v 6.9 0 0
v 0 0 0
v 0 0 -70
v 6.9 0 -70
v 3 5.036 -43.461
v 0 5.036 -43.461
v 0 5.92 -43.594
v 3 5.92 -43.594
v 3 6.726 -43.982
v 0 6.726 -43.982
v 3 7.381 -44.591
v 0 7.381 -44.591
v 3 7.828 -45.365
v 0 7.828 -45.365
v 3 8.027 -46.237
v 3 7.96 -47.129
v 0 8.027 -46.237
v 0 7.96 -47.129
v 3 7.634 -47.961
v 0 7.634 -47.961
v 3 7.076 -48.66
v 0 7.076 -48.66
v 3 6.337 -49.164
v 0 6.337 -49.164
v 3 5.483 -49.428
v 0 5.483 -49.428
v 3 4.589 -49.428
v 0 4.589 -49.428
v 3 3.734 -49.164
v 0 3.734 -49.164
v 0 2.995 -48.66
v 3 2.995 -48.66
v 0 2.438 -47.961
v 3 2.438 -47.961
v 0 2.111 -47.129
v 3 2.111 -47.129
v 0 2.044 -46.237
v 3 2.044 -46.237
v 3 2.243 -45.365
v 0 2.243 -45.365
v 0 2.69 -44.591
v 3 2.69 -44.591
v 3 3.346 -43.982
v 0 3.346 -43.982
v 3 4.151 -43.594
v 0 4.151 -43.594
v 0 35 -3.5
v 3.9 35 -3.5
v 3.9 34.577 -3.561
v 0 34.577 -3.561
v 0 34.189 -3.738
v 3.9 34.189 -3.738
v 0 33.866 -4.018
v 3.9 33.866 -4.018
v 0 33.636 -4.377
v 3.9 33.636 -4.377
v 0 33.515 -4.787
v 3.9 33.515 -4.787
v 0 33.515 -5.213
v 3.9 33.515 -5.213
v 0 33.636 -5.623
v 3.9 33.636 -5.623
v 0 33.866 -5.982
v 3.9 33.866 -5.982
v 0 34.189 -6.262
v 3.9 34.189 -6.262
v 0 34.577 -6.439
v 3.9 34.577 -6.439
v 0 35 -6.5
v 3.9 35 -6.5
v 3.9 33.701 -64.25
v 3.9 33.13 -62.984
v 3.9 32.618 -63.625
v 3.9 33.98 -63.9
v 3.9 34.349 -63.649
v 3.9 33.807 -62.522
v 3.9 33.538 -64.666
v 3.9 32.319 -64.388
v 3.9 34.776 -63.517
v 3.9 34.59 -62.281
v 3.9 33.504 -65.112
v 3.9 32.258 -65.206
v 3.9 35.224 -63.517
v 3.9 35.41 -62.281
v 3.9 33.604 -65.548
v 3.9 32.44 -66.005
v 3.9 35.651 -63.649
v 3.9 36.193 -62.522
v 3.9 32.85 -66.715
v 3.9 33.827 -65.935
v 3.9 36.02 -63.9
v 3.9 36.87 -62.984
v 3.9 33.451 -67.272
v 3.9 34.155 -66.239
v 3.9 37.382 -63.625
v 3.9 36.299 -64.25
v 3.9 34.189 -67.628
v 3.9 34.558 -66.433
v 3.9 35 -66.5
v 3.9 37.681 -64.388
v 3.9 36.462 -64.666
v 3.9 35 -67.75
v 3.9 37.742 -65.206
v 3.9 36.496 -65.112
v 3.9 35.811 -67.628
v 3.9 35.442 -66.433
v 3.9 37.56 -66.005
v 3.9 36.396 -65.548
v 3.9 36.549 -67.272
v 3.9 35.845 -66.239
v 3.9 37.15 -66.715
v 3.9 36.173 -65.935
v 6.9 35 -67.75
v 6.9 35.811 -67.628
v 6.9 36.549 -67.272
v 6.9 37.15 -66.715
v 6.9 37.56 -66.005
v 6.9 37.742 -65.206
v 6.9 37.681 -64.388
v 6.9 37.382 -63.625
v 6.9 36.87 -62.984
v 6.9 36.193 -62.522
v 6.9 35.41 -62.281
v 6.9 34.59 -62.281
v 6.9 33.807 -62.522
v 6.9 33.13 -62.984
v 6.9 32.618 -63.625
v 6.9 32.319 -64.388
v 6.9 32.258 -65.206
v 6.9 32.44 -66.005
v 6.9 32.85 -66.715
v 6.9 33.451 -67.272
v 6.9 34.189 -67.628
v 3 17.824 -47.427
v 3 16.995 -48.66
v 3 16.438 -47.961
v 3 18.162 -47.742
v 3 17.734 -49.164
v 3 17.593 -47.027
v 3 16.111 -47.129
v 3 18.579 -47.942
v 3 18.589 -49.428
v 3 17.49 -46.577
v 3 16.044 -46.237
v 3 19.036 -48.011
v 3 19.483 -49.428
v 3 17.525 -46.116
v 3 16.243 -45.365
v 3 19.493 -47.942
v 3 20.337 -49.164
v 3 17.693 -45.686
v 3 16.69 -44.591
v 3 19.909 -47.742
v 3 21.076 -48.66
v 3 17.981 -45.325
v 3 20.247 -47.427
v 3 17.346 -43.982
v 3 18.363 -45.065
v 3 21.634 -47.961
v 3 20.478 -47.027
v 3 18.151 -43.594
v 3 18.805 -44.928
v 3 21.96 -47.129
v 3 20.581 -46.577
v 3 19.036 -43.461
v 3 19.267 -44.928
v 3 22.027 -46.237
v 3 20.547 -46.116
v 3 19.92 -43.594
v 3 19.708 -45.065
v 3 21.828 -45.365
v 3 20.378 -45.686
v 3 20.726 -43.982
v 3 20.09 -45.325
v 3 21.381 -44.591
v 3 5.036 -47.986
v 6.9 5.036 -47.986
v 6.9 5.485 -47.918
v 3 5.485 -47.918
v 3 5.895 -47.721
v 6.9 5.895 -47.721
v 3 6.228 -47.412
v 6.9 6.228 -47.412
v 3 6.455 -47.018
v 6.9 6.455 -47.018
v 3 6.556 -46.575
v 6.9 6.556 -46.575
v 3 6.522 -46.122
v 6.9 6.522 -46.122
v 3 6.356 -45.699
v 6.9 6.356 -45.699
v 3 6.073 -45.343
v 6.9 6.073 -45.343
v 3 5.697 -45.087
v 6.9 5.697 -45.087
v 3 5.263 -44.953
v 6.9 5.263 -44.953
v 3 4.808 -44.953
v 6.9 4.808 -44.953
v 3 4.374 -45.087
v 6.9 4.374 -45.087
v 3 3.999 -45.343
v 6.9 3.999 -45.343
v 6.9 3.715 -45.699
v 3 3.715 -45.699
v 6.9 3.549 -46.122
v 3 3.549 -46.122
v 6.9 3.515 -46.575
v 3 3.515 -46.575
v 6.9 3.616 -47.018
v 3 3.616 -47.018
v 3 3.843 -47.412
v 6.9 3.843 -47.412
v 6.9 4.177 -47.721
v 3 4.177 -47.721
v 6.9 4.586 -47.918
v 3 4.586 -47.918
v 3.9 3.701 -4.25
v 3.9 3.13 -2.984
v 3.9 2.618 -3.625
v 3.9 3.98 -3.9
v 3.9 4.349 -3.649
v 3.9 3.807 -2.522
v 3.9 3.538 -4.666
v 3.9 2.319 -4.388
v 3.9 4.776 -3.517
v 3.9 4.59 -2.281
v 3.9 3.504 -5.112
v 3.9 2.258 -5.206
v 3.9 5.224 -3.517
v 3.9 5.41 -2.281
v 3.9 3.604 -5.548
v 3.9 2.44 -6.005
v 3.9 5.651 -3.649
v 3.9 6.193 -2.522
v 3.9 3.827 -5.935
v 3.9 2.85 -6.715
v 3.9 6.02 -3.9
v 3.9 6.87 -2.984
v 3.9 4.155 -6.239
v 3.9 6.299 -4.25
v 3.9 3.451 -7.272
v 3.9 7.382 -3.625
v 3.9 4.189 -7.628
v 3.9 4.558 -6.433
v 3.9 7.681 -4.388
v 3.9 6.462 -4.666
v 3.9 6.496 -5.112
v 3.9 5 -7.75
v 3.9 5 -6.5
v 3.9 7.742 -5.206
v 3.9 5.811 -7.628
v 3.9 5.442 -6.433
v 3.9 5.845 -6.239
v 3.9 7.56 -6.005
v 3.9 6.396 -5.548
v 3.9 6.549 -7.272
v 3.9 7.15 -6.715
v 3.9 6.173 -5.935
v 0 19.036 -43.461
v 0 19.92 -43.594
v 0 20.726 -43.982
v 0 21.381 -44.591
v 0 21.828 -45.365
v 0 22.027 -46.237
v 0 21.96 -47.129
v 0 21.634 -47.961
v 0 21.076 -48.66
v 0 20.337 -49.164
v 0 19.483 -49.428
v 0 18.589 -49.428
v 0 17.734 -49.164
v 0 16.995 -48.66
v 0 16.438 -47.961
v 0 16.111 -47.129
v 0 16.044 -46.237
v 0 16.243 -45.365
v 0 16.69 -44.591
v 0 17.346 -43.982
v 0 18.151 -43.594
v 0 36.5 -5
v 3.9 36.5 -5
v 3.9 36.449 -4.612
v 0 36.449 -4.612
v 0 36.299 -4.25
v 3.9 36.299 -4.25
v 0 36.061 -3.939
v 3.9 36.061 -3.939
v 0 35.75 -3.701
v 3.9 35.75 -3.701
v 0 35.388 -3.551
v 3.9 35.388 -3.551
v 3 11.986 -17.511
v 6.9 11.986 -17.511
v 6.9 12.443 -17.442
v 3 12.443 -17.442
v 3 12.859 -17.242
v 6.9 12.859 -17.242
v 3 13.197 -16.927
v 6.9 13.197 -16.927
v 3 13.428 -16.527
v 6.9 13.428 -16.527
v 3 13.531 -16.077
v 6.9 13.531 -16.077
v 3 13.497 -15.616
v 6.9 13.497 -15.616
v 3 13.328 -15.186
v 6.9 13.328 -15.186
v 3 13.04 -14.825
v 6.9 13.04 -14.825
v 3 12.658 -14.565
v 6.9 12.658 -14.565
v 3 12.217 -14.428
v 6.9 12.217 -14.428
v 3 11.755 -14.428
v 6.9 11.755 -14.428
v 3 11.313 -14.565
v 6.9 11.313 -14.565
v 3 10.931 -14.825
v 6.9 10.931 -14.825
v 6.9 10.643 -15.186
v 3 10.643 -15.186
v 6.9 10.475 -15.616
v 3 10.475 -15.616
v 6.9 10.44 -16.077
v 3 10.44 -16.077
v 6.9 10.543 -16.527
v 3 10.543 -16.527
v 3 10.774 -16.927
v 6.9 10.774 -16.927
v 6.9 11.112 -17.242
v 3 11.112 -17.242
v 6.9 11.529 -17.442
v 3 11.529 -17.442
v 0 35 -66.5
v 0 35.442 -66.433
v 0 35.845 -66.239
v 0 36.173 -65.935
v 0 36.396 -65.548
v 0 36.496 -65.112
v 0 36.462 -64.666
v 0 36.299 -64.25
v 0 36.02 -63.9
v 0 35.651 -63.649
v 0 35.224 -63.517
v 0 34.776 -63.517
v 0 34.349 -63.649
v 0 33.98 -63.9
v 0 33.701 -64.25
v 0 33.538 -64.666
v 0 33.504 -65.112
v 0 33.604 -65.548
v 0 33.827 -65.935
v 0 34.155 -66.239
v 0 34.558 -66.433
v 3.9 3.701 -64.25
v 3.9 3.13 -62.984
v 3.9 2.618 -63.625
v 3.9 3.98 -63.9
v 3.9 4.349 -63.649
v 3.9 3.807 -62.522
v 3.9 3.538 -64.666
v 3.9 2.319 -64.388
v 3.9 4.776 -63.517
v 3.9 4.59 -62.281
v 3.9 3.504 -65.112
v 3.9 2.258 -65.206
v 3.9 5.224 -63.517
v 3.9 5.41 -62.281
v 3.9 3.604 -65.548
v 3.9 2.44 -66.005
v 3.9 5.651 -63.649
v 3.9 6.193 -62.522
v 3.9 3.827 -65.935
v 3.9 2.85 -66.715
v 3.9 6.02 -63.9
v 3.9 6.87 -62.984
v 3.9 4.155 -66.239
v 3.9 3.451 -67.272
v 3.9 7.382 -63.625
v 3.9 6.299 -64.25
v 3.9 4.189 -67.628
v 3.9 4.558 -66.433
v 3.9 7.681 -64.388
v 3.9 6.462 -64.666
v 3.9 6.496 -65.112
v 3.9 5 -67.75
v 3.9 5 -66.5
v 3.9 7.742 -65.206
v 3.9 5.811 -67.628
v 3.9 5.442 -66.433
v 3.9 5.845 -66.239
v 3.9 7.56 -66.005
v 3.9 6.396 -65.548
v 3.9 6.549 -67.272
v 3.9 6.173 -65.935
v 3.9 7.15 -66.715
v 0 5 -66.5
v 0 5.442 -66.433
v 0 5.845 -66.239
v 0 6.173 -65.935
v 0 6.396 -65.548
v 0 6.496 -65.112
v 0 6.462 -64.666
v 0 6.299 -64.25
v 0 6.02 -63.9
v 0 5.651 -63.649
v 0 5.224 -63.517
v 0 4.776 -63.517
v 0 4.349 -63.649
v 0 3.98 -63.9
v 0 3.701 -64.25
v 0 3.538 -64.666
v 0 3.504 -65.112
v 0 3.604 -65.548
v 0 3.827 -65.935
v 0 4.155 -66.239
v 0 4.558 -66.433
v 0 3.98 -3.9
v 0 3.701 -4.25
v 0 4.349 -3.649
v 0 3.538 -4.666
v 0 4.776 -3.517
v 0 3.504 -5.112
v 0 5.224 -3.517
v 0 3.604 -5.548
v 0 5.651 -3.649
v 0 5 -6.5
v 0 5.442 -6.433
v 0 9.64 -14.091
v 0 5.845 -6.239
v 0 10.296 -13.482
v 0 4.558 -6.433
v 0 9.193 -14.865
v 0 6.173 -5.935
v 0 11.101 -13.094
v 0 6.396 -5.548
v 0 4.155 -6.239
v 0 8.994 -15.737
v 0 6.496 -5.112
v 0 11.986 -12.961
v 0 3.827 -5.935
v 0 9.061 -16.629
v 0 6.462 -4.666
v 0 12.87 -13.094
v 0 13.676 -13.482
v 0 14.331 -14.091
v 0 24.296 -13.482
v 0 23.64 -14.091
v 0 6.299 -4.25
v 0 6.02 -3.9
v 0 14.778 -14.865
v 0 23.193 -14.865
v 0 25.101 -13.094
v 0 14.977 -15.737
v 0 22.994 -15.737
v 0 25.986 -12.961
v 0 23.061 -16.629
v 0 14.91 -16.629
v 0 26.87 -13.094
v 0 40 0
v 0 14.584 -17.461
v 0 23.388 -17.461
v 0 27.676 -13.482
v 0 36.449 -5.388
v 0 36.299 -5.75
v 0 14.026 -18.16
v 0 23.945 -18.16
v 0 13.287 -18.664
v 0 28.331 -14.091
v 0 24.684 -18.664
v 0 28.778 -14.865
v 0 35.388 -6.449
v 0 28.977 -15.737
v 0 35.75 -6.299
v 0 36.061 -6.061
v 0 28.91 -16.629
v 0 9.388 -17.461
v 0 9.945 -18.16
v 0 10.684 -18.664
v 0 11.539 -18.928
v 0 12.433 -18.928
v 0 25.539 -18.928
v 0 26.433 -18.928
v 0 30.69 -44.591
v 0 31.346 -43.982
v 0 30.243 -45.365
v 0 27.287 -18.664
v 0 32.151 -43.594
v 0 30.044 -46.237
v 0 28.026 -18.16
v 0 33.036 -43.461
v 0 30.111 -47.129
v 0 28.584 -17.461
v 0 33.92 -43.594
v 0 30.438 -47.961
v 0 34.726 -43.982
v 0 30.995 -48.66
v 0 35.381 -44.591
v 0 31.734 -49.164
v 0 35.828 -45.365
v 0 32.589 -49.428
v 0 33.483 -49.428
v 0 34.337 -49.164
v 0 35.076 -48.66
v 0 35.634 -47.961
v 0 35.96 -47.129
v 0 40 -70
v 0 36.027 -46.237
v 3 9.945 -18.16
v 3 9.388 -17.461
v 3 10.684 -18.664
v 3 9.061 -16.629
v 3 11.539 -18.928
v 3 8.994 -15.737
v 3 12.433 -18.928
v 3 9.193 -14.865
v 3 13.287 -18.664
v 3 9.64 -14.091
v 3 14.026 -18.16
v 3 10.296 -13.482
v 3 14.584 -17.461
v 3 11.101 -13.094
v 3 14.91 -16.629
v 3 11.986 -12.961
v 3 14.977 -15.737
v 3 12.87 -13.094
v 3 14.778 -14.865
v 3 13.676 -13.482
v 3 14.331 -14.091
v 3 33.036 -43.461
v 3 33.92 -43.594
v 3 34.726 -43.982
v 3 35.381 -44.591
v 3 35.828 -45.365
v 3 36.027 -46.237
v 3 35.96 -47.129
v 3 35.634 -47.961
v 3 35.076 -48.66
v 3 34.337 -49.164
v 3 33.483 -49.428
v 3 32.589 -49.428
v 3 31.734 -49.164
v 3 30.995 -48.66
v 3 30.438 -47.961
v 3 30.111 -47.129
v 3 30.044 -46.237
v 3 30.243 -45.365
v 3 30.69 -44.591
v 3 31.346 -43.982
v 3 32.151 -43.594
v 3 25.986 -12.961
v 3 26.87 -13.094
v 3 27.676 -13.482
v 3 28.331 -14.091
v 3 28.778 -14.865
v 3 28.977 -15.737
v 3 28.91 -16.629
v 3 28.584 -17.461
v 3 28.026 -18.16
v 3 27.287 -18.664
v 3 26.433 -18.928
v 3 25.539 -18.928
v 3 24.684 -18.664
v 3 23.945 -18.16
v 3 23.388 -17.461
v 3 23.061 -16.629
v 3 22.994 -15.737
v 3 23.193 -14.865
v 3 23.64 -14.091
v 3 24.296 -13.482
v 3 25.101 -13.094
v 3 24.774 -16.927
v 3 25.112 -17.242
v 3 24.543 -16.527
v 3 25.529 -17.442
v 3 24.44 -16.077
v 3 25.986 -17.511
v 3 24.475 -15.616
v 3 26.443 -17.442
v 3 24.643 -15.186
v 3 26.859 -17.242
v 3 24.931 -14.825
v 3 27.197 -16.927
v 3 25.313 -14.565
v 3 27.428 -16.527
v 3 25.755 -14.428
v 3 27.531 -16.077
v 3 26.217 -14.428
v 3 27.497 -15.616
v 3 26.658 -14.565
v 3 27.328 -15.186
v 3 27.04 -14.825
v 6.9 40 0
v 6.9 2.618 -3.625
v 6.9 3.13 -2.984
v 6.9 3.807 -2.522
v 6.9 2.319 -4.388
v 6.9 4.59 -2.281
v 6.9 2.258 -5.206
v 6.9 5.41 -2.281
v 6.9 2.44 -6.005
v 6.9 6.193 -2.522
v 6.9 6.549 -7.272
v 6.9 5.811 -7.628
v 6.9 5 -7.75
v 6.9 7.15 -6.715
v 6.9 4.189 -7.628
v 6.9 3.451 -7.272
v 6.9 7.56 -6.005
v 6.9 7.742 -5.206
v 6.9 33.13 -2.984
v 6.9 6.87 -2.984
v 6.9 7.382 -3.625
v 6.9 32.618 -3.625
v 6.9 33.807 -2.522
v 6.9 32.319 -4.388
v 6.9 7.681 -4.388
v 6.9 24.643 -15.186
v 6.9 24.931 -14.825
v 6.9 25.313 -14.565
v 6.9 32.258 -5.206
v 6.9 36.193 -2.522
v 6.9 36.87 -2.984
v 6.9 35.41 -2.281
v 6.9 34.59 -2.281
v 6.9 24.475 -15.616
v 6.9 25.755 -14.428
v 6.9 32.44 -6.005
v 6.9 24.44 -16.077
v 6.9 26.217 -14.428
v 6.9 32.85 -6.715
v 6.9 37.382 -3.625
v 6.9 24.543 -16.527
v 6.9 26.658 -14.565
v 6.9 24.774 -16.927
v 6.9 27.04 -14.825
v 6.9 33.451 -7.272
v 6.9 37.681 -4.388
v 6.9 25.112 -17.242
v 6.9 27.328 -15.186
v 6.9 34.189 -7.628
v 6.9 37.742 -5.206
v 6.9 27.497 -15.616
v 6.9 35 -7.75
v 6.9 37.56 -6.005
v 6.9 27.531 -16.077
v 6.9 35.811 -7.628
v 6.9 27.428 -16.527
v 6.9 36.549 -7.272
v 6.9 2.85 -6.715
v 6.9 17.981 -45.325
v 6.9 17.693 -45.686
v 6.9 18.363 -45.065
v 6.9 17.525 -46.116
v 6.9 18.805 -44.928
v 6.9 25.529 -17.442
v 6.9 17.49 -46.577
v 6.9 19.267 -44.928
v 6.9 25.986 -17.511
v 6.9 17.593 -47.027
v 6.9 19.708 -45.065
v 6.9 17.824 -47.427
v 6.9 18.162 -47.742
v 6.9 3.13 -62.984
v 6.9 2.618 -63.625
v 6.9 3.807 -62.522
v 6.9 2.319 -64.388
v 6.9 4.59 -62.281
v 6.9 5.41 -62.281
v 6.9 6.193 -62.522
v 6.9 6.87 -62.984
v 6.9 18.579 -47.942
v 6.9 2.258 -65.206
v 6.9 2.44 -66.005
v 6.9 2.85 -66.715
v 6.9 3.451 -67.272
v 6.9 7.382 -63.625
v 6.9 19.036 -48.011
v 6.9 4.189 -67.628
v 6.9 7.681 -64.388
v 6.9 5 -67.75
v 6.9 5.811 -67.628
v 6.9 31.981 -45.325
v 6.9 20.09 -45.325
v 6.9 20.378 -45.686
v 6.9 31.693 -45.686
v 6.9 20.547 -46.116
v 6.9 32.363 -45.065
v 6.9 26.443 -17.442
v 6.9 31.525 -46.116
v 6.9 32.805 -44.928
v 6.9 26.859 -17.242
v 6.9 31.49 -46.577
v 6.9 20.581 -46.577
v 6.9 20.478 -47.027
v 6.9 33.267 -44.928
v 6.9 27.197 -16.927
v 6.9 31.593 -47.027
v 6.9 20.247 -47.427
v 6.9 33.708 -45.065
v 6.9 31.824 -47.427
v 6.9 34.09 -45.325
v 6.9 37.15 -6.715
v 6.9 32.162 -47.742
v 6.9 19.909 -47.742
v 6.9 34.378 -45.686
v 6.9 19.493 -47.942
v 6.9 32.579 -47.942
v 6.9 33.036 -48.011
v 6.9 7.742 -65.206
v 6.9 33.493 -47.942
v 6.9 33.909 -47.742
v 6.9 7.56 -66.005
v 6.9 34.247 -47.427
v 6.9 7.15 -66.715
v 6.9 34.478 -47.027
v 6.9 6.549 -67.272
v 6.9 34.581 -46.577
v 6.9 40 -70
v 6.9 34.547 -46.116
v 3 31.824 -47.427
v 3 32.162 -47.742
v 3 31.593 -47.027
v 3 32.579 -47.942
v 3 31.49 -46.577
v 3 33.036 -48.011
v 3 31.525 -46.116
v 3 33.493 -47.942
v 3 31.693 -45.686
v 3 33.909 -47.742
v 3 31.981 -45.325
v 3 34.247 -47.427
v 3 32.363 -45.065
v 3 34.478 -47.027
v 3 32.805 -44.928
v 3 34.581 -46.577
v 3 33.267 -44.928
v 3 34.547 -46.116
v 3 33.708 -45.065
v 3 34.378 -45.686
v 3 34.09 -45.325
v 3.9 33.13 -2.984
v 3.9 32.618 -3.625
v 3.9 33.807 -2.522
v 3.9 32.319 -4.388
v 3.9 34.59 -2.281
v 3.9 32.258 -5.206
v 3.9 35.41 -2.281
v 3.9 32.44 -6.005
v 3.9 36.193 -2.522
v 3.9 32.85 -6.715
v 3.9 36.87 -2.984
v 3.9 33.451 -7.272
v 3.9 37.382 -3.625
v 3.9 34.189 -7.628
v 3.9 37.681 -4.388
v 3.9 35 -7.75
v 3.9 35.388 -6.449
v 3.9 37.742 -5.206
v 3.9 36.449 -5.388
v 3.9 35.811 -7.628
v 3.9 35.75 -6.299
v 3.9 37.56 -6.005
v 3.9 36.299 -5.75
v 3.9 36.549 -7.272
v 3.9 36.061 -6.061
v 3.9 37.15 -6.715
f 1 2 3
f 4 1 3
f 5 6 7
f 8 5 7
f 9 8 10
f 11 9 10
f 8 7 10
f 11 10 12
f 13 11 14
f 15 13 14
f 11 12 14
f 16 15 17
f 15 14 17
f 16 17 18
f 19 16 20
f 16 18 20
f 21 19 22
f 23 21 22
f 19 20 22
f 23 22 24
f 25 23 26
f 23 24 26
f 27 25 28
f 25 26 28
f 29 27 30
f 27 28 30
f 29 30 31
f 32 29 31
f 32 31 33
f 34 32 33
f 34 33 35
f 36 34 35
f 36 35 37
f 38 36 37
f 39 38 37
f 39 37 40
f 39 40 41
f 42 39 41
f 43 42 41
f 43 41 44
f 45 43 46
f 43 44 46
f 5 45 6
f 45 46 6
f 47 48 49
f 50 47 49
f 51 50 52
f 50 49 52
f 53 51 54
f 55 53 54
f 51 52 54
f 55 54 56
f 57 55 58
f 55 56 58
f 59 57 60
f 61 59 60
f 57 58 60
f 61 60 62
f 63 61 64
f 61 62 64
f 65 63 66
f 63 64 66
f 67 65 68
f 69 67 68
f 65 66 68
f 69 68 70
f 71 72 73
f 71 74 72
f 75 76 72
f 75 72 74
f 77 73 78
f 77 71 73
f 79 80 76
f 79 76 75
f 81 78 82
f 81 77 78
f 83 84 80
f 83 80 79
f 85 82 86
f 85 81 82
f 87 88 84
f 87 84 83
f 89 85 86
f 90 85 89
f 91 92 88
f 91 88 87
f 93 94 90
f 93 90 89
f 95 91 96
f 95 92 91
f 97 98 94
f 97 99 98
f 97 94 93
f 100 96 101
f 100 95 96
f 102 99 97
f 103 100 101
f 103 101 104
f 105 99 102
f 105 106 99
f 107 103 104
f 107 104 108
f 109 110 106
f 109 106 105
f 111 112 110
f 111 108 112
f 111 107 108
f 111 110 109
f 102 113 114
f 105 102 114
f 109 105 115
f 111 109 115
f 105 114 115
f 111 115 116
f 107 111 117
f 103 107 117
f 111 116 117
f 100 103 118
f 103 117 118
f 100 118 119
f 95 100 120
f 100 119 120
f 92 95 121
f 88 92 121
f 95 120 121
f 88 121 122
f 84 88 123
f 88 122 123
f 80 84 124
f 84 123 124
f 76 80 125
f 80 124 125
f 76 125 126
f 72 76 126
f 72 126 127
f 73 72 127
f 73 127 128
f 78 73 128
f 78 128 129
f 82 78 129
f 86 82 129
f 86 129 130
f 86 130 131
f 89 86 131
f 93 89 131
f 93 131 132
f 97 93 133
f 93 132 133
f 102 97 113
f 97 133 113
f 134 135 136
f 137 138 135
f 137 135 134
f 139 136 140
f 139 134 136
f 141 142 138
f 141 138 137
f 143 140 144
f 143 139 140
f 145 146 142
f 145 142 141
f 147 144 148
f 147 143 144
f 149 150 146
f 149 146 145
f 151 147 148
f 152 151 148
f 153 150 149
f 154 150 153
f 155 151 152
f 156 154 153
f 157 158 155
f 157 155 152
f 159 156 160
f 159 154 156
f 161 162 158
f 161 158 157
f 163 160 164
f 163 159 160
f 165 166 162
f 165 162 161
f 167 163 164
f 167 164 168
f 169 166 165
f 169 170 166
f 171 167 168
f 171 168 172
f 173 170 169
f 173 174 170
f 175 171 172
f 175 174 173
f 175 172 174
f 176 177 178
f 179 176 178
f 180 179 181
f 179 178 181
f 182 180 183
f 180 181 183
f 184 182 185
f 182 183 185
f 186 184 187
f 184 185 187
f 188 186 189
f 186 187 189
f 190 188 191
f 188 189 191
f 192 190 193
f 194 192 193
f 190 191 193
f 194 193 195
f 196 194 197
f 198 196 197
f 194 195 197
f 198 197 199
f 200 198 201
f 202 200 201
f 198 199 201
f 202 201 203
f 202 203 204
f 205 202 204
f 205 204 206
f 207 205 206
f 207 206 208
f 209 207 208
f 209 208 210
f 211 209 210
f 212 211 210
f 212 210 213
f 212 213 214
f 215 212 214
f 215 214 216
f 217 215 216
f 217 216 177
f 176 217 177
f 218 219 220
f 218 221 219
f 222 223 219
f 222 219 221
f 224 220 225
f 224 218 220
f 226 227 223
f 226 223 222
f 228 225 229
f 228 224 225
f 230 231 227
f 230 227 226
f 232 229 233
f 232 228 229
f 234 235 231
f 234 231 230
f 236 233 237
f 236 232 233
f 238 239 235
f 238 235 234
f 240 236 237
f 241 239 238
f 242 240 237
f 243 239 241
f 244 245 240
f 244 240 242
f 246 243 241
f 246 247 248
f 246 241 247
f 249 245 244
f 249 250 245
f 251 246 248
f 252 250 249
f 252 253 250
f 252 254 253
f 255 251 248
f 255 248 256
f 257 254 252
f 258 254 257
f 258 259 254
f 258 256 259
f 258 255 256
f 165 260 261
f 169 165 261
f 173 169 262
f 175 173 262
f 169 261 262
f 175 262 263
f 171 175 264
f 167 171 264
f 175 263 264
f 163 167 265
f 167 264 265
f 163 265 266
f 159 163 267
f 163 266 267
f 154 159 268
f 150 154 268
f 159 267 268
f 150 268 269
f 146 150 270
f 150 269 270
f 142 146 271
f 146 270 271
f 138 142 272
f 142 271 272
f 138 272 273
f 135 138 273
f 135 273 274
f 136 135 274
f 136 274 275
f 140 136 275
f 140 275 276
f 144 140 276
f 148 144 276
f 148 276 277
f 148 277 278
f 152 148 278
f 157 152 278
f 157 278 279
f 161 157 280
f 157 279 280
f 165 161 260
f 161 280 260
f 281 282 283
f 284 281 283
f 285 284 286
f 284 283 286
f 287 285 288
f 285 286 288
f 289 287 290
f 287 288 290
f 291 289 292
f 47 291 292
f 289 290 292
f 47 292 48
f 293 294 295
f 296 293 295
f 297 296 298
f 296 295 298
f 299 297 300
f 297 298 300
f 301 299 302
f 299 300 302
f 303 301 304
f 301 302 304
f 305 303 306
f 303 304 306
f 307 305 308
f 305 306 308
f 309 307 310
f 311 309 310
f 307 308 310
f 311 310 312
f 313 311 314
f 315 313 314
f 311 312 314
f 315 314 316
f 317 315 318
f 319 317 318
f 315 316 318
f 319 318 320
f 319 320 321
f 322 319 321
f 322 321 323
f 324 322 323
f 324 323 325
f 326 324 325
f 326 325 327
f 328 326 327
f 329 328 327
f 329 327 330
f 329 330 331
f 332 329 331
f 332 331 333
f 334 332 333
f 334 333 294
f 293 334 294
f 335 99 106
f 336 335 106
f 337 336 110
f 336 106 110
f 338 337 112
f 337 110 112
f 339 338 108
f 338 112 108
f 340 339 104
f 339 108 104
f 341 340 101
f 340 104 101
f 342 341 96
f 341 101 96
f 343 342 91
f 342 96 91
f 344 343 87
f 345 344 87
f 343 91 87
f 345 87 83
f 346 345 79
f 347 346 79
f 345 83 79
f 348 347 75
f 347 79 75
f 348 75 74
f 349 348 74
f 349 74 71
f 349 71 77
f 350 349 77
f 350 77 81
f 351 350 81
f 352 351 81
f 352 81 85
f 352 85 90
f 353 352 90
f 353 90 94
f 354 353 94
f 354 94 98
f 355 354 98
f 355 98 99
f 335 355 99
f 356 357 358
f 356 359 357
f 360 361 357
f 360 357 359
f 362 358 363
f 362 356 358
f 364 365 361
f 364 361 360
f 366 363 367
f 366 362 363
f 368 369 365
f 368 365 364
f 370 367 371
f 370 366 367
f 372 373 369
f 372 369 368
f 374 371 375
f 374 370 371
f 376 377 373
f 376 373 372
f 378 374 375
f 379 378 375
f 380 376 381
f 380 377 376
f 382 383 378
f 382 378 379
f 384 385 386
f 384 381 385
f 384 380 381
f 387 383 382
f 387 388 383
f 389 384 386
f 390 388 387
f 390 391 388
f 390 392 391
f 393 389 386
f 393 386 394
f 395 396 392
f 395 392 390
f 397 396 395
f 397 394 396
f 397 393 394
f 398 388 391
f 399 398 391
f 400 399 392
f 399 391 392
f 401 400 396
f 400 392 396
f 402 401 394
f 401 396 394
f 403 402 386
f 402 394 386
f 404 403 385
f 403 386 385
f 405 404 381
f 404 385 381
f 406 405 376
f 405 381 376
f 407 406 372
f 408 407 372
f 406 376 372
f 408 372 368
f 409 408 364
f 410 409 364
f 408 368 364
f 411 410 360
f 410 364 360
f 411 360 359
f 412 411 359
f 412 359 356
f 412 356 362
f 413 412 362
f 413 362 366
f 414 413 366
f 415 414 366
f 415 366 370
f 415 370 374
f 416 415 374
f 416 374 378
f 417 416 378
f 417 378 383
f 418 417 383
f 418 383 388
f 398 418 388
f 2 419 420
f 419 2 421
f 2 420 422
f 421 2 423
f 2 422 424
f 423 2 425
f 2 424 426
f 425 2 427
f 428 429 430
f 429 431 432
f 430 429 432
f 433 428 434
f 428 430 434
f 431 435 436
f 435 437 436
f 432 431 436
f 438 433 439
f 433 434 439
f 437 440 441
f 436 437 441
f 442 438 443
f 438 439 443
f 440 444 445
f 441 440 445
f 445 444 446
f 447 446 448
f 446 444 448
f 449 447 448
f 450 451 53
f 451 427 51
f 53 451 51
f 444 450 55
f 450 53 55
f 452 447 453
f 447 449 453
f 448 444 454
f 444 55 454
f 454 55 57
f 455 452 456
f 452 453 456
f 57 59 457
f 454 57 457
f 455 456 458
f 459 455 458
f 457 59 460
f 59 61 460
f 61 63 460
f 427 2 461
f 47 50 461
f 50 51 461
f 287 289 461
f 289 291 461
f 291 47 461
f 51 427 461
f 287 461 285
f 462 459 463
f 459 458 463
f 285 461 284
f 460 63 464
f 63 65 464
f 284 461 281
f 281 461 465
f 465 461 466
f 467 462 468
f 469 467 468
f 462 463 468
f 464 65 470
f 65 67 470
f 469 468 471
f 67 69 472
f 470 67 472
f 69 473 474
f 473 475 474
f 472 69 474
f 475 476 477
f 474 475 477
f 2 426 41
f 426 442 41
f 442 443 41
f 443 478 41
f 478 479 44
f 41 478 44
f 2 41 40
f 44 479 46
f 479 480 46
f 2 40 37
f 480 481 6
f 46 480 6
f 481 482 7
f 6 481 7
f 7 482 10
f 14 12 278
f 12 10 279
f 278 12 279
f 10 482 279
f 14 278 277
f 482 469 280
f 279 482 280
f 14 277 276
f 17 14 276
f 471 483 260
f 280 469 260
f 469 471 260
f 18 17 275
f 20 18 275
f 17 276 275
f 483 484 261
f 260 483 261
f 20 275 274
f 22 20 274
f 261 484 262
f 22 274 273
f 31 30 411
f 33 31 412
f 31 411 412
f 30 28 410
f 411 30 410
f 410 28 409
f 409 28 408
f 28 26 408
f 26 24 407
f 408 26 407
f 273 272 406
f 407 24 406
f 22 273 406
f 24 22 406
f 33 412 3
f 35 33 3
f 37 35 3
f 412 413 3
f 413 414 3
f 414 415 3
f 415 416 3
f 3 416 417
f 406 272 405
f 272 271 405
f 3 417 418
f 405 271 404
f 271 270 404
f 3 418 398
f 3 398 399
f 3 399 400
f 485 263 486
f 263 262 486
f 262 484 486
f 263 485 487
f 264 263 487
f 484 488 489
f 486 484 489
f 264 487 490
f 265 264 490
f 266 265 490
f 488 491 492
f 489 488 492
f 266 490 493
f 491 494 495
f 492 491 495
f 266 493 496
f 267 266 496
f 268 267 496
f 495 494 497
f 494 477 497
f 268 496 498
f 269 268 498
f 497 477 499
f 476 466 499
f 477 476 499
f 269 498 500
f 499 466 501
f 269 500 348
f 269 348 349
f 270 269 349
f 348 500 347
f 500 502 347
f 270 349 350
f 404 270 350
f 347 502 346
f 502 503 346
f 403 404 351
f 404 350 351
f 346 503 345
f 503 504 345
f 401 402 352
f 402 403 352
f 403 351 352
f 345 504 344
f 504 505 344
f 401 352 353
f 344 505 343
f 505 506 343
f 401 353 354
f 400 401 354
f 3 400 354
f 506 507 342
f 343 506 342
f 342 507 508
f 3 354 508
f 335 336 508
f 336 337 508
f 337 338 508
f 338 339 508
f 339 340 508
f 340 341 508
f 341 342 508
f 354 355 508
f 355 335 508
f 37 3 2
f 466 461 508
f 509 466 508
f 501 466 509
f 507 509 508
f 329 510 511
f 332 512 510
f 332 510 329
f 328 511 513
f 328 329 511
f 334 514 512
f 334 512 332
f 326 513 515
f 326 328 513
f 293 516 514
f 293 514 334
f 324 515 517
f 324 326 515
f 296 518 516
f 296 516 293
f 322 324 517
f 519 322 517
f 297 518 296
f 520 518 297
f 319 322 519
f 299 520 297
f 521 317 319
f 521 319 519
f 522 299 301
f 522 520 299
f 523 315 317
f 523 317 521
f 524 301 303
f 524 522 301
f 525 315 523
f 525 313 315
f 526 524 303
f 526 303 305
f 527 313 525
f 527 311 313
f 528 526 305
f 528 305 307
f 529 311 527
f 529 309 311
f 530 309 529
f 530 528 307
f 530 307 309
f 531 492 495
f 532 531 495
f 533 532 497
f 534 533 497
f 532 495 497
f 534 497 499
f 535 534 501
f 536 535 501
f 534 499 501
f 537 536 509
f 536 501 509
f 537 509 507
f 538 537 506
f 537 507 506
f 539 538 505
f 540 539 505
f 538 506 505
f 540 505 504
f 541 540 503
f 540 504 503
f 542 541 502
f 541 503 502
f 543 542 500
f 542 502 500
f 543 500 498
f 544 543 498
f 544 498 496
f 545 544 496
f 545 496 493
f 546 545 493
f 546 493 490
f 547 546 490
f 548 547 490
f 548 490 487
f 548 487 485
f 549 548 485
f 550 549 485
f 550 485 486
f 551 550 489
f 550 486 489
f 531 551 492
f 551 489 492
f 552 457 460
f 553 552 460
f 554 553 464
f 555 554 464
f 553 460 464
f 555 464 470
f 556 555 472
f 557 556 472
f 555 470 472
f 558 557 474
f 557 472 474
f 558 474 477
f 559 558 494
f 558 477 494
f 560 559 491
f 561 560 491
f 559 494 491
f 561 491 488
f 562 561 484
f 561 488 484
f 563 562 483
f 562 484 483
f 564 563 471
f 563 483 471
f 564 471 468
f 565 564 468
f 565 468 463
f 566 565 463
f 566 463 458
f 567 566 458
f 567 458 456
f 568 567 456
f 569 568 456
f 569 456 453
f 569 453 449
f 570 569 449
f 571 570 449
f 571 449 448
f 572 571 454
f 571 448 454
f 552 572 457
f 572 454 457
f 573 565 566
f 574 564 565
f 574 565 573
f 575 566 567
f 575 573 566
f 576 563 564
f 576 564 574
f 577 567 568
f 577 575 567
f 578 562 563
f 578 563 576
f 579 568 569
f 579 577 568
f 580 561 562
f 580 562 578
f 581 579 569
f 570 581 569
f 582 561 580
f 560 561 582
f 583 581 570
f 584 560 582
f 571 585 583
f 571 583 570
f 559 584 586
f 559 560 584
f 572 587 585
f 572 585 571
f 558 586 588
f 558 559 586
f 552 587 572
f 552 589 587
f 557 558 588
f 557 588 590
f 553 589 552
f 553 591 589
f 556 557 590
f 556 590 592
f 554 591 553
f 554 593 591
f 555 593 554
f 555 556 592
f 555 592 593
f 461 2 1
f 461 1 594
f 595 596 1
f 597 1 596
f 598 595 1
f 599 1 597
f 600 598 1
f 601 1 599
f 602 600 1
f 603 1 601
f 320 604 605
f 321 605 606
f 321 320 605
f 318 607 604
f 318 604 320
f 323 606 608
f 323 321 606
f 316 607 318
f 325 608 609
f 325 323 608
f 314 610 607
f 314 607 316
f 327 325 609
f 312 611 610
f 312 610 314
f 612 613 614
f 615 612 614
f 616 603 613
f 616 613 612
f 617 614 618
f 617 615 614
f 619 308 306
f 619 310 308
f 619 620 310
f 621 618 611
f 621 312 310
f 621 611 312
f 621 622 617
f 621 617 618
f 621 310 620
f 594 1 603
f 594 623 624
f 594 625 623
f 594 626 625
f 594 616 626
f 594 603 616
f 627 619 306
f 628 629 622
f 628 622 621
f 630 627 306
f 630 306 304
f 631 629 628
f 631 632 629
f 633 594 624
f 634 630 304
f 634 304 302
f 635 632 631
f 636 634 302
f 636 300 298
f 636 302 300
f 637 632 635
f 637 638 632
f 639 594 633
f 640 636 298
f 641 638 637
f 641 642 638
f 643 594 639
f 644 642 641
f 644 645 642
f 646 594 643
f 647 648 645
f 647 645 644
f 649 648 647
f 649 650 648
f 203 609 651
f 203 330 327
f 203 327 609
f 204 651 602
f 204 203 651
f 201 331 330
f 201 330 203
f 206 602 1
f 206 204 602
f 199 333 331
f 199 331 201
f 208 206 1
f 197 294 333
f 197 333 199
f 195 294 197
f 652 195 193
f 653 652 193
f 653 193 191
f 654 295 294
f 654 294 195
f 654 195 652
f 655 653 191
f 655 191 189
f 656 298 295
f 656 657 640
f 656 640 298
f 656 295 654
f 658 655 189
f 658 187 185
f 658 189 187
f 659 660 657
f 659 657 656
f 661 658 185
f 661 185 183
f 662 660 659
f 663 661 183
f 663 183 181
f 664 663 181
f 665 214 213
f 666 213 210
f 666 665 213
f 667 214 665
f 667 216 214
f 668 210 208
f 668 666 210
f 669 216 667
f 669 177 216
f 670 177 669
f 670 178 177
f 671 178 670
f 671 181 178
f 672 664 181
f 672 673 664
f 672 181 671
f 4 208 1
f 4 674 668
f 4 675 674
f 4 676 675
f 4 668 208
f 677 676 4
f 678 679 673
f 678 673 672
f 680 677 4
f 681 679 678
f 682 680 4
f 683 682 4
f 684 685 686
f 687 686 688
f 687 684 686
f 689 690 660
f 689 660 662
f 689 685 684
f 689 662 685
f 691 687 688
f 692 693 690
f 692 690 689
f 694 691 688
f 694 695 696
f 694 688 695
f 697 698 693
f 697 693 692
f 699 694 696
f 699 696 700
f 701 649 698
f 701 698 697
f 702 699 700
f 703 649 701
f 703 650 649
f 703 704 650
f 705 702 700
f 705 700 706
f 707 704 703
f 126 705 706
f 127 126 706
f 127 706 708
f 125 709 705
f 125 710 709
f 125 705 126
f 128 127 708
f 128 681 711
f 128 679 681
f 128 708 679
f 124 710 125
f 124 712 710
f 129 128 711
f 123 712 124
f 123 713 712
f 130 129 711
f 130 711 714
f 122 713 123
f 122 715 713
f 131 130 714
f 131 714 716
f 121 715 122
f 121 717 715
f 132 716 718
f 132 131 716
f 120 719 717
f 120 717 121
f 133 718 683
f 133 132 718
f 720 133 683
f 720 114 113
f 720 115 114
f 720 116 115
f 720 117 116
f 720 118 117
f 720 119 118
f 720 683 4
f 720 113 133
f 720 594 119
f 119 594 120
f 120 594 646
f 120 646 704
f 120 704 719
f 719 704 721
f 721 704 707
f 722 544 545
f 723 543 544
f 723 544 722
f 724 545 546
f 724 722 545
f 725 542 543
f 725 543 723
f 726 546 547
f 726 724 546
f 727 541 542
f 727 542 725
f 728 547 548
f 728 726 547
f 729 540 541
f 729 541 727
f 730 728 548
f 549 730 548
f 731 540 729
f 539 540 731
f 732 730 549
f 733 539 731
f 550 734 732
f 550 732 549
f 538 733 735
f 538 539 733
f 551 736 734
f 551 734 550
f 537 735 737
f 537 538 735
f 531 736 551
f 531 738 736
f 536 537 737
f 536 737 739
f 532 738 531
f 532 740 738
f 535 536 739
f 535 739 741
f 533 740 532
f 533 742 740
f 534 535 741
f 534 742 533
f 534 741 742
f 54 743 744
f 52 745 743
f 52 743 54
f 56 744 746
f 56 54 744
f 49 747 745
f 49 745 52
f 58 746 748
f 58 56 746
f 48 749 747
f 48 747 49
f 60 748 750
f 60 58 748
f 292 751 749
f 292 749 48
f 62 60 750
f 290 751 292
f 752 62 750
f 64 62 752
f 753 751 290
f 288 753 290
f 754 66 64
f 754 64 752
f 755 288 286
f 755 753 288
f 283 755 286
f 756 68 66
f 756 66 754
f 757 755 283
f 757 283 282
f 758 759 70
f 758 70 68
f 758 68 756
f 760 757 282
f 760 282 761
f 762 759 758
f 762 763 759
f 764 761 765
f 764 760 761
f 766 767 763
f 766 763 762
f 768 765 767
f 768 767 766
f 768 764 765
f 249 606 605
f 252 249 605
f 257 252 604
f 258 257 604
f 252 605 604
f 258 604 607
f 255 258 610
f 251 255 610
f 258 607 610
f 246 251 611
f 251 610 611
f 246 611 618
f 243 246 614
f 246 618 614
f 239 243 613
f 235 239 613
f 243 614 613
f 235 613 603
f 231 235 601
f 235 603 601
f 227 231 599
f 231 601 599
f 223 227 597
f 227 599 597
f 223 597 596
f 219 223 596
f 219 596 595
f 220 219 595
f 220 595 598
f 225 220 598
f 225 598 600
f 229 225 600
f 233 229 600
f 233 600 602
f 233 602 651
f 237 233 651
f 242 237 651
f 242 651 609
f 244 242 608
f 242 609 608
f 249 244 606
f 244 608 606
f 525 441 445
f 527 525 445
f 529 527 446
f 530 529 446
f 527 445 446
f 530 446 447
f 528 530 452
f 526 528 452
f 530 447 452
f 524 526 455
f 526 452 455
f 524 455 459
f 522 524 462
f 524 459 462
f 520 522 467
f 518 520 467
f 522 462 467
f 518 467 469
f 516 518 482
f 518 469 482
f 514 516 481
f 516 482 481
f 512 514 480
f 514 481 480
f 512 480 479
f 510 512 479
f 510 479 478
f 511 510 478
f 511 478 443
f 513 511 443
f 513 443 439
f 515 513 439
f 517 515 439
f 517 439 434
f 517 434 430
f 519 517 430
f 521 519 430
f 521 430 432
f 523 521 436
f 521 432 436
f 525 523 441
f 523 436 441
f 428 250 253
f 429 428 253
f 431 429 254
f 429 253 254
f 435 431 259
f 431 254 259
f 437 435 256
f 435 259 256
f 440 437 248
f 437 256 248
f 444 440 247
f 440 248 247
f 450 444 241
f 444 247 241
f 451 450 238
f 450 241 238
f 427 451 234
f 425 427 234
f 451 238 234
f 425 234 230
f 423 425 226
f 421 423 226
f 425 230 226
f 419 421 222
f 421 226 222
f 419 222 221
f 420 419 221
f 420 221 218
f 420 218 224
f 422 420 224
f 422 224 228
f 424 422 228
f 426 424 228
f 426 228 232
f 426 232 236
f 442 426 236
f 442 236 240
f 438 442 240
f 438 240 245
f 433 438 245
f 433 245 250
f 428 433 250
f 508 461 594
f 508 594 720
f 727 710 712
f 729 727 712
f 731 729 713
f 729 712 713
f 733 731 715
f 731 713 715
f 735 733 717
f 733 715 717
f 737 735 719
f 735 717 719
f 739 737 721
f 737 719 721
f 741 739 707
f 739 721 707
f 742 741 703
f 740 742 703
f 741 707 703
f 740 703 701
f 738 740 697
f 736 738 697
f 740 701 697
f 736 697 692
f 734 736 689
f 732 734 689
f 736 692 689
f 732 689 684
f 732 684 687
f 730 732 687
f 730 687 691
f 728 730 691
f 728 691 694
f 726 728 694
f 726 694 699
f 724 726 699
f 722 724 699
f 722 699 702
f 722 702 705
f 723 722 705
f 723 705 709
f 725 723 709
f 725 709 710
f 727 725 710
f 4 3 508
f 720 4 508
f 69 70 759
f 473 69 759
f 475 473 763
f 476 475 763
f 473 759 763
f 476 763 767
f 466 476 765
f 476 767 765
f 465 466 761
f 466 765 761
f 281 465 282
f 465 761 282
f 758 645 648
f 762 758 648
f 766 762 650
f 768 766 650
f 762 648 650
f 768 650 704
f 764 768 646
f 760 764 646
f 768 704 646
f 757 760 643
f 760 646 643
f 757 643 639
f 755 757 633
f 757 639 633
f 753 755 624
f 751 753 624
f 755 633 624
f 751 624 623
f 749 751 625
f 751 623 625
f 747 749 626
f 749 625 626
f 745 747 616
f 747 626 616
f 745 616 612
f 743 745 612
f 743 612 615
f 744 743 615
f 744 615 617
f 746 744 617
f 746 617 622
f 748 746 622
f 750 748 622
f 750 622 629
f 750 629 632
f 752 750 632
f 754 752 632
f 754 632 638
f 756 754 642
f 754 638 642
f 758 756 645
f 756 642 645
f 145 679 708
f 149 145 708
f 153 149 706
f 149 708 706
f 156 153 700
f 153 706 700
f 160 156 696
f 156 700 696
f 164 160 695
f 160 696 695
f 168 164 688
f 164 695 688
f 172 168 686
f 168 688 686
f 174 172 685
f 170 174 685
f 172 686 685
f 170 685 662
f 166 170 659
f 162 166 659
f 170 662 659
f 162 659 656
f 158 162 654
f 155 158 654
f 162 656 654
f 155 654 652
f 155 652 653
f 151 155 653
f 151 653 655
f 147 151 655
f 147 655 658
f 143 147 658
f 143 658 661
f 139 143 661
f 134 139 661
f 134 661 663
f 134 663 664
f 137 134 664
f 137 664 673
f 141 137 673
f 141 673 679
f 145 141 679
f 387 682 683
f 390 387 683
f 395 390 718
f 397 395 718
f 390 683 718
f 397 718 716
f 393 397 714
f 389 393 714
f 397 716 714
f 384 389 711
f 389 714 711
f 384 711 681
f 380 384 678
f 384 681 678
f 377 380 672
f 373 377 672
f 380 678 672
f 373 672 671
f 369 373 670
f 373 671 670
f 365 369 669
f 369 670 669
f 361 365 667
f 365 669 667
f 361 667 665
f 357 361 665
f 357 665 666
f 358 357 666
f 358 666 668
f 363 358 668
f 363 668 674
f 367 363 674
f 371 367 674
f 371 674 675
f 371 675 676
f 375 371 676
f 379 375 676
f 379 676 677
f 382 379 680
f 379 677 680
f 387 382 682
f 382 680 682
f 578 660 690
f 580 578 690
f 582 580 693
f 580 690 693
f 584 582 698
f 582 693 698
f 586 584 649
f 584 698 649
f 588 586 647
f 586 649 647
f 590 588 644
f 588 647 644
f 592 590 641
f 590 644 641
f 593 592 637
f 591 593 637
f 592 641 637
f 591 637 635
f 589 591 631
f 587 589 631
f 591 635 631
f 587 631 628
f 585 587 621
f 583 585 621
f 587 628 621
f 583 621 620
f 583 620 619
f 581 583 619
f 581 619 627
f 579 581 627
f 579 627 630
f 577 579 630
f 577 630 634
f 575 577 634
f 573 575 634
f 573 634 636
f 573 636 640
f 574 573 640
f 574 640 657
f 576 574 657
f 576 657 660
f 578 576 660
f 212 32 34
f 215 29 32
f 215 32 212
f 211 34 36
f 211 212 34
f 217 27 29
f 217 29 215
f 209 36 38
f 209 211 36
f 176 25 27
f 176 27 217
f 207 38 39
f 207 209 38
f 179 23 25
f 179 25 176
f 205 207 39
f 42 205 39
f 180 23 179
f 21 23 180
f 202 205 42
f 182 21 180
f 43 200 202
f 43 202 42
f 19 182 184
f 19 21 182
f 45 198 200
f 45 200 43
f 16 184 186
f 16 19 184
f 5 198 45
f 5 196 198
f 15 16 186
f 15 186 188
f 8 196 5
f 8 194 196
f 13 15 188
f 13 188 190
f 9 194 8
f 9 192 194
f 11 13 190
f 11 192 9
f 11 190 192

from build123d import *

# Parameters (mm, degrees)
SKETCH_1_W          = 70
SKETCH_1_H          = 40
EXTRUDE_3_DEPTH     = 6.9
SKETCH_2_R          = 1.5
CUT_EXTRUDE_1_DEPTH = 6.9
SKETCH_5_R          = 2.75
CUT_EXTRUDE_3_DEPTH = 3
SKETCH_6_R          = 1.52480842
SKETCH_6_R_2        = 1.55
CUT_EXTRUDE_4_DEPTH = 10
SKETCH_7_R          = 3
CUT_EXTRUDE_6_DEPTH = 3


with BuildPart() as part:
    # 草图1 → 凸台-拉伸3 (new body)
    with BuildSketch(Plane(origin=(0, 0, 0), x_dir=(0, 0, -1), z_dir=(1, 0, 0))):
        with Locations((35, 20)):
            Rectangle(SKETCH_1_W, SKETCH_1_H)
    extrude(amount=EXTRUDE_3_DEPTH)

    # 草图2 → 切除-拉伸1 (cut)
    with BuildSketch(Plane(origin=(6.9, 0, 0), x_dir=(0, 0, -1), z_dir=(1, 0, 0))):
        with BuildLine():
            ThreePointArc((6.5, 35), (6.060660172, 36.060660172), (5, 36.5))
            Line((5, 36.5), (5, 35))
            Line((5, 35), (3.5, 35))
            ThreePointArc((3.5, 35), (5, 33.5), (6.5, 35))
        make_face()
        with BuildLine():
            Line((5, 35), (5, 36.5))
            ThreePointArc((5, 36.5), (3.939339828, 36.060660172), (3.5, 35))
            Line((3.5, 35), (5, 35))
        make_face()
        with Locations((5, 5)):
            Circle(SKETCH_2_R)
        with Locations((65, 5)):
            Circle(SKETCH_2_R)
        with Locations((65, 35)):
            Circle(SKETCH_2_R)
    extrude(amount=-CUT_EXTRUDE_1_DEPTH, mode=Mode.SUBTRACT)

    # 草图5 → 切除-拉伸3 (cut)
    with BuildSketch(Plane(origin=(6.9, 0, 0), x_dir=(0, 0, -1), z_dir=(1, 0, 0))):
        with Locations((5, 35)):
            Circle(SKETCH_5_R)
        with Locations((5, 5)):
            Circle(SKETCH_5_R)
        with Locations((65, 35)):
            Circle(SKETCH_5_R)
        with Locations((65, 5)):
            Circle(SKETCH_5_R)
    extrude(amount=-CUT_EXTRUDE_3_DEPTH, mode=Mode.SUBTRACT)

    # 草图6 → 切除-拉伸4 (cut)
    with BuildSketch(Plane(origin=(6.9, 0, 0), x_dir=(0, 0, -1), z_dir=(1, 0, 0))):
        with Locations((46.461053437, 5.03563892)):
            Circle(SKETCH_6_R)
        with Locations((46.461053437, 19.03563892)):
            Circle(SKETCH_6_R_2)
        with Locations((46.461053437, 33.03563892)):
            Circle(SKETCH_6_R_2)
        with Locations((15.961053437, 25.98563892)):
            Circle(SKETCH_6_R_2)
        with Locations((15.961053437, 11.98563892)):
            Circle(SKETCH_6_R_2)
    extrude(amount=-CUT_EXTRUDE_4_DEPTH, mode=Mode.SUBTRACT)

    # 草图7 → 切除-拉伸6 (cut)
    with BuildSketch(Plane.ZY):
        with Locations((-46.461053437, 33.03563892)):
            Circle(SKETCH_7_R)
        with Locations((-46.461053437, 19.03563892)):
            Circle(SKETCH_7_R)
        with Locations((-46.461053437, 5.03563892)):
            Circle(SKETCH_7_R)
        with Locations((-15.961053437, 11.98563892)):
            Circle(SKETCH_7_R)
        with Locations((-15.961053437, 25.98563892)):
            Circle(SKETCH_7_R)
    extrude(amount=-CUT_EXTRUDE_6_DEPTH, mode=Mode.SUBTRACT)


solid = part.part
